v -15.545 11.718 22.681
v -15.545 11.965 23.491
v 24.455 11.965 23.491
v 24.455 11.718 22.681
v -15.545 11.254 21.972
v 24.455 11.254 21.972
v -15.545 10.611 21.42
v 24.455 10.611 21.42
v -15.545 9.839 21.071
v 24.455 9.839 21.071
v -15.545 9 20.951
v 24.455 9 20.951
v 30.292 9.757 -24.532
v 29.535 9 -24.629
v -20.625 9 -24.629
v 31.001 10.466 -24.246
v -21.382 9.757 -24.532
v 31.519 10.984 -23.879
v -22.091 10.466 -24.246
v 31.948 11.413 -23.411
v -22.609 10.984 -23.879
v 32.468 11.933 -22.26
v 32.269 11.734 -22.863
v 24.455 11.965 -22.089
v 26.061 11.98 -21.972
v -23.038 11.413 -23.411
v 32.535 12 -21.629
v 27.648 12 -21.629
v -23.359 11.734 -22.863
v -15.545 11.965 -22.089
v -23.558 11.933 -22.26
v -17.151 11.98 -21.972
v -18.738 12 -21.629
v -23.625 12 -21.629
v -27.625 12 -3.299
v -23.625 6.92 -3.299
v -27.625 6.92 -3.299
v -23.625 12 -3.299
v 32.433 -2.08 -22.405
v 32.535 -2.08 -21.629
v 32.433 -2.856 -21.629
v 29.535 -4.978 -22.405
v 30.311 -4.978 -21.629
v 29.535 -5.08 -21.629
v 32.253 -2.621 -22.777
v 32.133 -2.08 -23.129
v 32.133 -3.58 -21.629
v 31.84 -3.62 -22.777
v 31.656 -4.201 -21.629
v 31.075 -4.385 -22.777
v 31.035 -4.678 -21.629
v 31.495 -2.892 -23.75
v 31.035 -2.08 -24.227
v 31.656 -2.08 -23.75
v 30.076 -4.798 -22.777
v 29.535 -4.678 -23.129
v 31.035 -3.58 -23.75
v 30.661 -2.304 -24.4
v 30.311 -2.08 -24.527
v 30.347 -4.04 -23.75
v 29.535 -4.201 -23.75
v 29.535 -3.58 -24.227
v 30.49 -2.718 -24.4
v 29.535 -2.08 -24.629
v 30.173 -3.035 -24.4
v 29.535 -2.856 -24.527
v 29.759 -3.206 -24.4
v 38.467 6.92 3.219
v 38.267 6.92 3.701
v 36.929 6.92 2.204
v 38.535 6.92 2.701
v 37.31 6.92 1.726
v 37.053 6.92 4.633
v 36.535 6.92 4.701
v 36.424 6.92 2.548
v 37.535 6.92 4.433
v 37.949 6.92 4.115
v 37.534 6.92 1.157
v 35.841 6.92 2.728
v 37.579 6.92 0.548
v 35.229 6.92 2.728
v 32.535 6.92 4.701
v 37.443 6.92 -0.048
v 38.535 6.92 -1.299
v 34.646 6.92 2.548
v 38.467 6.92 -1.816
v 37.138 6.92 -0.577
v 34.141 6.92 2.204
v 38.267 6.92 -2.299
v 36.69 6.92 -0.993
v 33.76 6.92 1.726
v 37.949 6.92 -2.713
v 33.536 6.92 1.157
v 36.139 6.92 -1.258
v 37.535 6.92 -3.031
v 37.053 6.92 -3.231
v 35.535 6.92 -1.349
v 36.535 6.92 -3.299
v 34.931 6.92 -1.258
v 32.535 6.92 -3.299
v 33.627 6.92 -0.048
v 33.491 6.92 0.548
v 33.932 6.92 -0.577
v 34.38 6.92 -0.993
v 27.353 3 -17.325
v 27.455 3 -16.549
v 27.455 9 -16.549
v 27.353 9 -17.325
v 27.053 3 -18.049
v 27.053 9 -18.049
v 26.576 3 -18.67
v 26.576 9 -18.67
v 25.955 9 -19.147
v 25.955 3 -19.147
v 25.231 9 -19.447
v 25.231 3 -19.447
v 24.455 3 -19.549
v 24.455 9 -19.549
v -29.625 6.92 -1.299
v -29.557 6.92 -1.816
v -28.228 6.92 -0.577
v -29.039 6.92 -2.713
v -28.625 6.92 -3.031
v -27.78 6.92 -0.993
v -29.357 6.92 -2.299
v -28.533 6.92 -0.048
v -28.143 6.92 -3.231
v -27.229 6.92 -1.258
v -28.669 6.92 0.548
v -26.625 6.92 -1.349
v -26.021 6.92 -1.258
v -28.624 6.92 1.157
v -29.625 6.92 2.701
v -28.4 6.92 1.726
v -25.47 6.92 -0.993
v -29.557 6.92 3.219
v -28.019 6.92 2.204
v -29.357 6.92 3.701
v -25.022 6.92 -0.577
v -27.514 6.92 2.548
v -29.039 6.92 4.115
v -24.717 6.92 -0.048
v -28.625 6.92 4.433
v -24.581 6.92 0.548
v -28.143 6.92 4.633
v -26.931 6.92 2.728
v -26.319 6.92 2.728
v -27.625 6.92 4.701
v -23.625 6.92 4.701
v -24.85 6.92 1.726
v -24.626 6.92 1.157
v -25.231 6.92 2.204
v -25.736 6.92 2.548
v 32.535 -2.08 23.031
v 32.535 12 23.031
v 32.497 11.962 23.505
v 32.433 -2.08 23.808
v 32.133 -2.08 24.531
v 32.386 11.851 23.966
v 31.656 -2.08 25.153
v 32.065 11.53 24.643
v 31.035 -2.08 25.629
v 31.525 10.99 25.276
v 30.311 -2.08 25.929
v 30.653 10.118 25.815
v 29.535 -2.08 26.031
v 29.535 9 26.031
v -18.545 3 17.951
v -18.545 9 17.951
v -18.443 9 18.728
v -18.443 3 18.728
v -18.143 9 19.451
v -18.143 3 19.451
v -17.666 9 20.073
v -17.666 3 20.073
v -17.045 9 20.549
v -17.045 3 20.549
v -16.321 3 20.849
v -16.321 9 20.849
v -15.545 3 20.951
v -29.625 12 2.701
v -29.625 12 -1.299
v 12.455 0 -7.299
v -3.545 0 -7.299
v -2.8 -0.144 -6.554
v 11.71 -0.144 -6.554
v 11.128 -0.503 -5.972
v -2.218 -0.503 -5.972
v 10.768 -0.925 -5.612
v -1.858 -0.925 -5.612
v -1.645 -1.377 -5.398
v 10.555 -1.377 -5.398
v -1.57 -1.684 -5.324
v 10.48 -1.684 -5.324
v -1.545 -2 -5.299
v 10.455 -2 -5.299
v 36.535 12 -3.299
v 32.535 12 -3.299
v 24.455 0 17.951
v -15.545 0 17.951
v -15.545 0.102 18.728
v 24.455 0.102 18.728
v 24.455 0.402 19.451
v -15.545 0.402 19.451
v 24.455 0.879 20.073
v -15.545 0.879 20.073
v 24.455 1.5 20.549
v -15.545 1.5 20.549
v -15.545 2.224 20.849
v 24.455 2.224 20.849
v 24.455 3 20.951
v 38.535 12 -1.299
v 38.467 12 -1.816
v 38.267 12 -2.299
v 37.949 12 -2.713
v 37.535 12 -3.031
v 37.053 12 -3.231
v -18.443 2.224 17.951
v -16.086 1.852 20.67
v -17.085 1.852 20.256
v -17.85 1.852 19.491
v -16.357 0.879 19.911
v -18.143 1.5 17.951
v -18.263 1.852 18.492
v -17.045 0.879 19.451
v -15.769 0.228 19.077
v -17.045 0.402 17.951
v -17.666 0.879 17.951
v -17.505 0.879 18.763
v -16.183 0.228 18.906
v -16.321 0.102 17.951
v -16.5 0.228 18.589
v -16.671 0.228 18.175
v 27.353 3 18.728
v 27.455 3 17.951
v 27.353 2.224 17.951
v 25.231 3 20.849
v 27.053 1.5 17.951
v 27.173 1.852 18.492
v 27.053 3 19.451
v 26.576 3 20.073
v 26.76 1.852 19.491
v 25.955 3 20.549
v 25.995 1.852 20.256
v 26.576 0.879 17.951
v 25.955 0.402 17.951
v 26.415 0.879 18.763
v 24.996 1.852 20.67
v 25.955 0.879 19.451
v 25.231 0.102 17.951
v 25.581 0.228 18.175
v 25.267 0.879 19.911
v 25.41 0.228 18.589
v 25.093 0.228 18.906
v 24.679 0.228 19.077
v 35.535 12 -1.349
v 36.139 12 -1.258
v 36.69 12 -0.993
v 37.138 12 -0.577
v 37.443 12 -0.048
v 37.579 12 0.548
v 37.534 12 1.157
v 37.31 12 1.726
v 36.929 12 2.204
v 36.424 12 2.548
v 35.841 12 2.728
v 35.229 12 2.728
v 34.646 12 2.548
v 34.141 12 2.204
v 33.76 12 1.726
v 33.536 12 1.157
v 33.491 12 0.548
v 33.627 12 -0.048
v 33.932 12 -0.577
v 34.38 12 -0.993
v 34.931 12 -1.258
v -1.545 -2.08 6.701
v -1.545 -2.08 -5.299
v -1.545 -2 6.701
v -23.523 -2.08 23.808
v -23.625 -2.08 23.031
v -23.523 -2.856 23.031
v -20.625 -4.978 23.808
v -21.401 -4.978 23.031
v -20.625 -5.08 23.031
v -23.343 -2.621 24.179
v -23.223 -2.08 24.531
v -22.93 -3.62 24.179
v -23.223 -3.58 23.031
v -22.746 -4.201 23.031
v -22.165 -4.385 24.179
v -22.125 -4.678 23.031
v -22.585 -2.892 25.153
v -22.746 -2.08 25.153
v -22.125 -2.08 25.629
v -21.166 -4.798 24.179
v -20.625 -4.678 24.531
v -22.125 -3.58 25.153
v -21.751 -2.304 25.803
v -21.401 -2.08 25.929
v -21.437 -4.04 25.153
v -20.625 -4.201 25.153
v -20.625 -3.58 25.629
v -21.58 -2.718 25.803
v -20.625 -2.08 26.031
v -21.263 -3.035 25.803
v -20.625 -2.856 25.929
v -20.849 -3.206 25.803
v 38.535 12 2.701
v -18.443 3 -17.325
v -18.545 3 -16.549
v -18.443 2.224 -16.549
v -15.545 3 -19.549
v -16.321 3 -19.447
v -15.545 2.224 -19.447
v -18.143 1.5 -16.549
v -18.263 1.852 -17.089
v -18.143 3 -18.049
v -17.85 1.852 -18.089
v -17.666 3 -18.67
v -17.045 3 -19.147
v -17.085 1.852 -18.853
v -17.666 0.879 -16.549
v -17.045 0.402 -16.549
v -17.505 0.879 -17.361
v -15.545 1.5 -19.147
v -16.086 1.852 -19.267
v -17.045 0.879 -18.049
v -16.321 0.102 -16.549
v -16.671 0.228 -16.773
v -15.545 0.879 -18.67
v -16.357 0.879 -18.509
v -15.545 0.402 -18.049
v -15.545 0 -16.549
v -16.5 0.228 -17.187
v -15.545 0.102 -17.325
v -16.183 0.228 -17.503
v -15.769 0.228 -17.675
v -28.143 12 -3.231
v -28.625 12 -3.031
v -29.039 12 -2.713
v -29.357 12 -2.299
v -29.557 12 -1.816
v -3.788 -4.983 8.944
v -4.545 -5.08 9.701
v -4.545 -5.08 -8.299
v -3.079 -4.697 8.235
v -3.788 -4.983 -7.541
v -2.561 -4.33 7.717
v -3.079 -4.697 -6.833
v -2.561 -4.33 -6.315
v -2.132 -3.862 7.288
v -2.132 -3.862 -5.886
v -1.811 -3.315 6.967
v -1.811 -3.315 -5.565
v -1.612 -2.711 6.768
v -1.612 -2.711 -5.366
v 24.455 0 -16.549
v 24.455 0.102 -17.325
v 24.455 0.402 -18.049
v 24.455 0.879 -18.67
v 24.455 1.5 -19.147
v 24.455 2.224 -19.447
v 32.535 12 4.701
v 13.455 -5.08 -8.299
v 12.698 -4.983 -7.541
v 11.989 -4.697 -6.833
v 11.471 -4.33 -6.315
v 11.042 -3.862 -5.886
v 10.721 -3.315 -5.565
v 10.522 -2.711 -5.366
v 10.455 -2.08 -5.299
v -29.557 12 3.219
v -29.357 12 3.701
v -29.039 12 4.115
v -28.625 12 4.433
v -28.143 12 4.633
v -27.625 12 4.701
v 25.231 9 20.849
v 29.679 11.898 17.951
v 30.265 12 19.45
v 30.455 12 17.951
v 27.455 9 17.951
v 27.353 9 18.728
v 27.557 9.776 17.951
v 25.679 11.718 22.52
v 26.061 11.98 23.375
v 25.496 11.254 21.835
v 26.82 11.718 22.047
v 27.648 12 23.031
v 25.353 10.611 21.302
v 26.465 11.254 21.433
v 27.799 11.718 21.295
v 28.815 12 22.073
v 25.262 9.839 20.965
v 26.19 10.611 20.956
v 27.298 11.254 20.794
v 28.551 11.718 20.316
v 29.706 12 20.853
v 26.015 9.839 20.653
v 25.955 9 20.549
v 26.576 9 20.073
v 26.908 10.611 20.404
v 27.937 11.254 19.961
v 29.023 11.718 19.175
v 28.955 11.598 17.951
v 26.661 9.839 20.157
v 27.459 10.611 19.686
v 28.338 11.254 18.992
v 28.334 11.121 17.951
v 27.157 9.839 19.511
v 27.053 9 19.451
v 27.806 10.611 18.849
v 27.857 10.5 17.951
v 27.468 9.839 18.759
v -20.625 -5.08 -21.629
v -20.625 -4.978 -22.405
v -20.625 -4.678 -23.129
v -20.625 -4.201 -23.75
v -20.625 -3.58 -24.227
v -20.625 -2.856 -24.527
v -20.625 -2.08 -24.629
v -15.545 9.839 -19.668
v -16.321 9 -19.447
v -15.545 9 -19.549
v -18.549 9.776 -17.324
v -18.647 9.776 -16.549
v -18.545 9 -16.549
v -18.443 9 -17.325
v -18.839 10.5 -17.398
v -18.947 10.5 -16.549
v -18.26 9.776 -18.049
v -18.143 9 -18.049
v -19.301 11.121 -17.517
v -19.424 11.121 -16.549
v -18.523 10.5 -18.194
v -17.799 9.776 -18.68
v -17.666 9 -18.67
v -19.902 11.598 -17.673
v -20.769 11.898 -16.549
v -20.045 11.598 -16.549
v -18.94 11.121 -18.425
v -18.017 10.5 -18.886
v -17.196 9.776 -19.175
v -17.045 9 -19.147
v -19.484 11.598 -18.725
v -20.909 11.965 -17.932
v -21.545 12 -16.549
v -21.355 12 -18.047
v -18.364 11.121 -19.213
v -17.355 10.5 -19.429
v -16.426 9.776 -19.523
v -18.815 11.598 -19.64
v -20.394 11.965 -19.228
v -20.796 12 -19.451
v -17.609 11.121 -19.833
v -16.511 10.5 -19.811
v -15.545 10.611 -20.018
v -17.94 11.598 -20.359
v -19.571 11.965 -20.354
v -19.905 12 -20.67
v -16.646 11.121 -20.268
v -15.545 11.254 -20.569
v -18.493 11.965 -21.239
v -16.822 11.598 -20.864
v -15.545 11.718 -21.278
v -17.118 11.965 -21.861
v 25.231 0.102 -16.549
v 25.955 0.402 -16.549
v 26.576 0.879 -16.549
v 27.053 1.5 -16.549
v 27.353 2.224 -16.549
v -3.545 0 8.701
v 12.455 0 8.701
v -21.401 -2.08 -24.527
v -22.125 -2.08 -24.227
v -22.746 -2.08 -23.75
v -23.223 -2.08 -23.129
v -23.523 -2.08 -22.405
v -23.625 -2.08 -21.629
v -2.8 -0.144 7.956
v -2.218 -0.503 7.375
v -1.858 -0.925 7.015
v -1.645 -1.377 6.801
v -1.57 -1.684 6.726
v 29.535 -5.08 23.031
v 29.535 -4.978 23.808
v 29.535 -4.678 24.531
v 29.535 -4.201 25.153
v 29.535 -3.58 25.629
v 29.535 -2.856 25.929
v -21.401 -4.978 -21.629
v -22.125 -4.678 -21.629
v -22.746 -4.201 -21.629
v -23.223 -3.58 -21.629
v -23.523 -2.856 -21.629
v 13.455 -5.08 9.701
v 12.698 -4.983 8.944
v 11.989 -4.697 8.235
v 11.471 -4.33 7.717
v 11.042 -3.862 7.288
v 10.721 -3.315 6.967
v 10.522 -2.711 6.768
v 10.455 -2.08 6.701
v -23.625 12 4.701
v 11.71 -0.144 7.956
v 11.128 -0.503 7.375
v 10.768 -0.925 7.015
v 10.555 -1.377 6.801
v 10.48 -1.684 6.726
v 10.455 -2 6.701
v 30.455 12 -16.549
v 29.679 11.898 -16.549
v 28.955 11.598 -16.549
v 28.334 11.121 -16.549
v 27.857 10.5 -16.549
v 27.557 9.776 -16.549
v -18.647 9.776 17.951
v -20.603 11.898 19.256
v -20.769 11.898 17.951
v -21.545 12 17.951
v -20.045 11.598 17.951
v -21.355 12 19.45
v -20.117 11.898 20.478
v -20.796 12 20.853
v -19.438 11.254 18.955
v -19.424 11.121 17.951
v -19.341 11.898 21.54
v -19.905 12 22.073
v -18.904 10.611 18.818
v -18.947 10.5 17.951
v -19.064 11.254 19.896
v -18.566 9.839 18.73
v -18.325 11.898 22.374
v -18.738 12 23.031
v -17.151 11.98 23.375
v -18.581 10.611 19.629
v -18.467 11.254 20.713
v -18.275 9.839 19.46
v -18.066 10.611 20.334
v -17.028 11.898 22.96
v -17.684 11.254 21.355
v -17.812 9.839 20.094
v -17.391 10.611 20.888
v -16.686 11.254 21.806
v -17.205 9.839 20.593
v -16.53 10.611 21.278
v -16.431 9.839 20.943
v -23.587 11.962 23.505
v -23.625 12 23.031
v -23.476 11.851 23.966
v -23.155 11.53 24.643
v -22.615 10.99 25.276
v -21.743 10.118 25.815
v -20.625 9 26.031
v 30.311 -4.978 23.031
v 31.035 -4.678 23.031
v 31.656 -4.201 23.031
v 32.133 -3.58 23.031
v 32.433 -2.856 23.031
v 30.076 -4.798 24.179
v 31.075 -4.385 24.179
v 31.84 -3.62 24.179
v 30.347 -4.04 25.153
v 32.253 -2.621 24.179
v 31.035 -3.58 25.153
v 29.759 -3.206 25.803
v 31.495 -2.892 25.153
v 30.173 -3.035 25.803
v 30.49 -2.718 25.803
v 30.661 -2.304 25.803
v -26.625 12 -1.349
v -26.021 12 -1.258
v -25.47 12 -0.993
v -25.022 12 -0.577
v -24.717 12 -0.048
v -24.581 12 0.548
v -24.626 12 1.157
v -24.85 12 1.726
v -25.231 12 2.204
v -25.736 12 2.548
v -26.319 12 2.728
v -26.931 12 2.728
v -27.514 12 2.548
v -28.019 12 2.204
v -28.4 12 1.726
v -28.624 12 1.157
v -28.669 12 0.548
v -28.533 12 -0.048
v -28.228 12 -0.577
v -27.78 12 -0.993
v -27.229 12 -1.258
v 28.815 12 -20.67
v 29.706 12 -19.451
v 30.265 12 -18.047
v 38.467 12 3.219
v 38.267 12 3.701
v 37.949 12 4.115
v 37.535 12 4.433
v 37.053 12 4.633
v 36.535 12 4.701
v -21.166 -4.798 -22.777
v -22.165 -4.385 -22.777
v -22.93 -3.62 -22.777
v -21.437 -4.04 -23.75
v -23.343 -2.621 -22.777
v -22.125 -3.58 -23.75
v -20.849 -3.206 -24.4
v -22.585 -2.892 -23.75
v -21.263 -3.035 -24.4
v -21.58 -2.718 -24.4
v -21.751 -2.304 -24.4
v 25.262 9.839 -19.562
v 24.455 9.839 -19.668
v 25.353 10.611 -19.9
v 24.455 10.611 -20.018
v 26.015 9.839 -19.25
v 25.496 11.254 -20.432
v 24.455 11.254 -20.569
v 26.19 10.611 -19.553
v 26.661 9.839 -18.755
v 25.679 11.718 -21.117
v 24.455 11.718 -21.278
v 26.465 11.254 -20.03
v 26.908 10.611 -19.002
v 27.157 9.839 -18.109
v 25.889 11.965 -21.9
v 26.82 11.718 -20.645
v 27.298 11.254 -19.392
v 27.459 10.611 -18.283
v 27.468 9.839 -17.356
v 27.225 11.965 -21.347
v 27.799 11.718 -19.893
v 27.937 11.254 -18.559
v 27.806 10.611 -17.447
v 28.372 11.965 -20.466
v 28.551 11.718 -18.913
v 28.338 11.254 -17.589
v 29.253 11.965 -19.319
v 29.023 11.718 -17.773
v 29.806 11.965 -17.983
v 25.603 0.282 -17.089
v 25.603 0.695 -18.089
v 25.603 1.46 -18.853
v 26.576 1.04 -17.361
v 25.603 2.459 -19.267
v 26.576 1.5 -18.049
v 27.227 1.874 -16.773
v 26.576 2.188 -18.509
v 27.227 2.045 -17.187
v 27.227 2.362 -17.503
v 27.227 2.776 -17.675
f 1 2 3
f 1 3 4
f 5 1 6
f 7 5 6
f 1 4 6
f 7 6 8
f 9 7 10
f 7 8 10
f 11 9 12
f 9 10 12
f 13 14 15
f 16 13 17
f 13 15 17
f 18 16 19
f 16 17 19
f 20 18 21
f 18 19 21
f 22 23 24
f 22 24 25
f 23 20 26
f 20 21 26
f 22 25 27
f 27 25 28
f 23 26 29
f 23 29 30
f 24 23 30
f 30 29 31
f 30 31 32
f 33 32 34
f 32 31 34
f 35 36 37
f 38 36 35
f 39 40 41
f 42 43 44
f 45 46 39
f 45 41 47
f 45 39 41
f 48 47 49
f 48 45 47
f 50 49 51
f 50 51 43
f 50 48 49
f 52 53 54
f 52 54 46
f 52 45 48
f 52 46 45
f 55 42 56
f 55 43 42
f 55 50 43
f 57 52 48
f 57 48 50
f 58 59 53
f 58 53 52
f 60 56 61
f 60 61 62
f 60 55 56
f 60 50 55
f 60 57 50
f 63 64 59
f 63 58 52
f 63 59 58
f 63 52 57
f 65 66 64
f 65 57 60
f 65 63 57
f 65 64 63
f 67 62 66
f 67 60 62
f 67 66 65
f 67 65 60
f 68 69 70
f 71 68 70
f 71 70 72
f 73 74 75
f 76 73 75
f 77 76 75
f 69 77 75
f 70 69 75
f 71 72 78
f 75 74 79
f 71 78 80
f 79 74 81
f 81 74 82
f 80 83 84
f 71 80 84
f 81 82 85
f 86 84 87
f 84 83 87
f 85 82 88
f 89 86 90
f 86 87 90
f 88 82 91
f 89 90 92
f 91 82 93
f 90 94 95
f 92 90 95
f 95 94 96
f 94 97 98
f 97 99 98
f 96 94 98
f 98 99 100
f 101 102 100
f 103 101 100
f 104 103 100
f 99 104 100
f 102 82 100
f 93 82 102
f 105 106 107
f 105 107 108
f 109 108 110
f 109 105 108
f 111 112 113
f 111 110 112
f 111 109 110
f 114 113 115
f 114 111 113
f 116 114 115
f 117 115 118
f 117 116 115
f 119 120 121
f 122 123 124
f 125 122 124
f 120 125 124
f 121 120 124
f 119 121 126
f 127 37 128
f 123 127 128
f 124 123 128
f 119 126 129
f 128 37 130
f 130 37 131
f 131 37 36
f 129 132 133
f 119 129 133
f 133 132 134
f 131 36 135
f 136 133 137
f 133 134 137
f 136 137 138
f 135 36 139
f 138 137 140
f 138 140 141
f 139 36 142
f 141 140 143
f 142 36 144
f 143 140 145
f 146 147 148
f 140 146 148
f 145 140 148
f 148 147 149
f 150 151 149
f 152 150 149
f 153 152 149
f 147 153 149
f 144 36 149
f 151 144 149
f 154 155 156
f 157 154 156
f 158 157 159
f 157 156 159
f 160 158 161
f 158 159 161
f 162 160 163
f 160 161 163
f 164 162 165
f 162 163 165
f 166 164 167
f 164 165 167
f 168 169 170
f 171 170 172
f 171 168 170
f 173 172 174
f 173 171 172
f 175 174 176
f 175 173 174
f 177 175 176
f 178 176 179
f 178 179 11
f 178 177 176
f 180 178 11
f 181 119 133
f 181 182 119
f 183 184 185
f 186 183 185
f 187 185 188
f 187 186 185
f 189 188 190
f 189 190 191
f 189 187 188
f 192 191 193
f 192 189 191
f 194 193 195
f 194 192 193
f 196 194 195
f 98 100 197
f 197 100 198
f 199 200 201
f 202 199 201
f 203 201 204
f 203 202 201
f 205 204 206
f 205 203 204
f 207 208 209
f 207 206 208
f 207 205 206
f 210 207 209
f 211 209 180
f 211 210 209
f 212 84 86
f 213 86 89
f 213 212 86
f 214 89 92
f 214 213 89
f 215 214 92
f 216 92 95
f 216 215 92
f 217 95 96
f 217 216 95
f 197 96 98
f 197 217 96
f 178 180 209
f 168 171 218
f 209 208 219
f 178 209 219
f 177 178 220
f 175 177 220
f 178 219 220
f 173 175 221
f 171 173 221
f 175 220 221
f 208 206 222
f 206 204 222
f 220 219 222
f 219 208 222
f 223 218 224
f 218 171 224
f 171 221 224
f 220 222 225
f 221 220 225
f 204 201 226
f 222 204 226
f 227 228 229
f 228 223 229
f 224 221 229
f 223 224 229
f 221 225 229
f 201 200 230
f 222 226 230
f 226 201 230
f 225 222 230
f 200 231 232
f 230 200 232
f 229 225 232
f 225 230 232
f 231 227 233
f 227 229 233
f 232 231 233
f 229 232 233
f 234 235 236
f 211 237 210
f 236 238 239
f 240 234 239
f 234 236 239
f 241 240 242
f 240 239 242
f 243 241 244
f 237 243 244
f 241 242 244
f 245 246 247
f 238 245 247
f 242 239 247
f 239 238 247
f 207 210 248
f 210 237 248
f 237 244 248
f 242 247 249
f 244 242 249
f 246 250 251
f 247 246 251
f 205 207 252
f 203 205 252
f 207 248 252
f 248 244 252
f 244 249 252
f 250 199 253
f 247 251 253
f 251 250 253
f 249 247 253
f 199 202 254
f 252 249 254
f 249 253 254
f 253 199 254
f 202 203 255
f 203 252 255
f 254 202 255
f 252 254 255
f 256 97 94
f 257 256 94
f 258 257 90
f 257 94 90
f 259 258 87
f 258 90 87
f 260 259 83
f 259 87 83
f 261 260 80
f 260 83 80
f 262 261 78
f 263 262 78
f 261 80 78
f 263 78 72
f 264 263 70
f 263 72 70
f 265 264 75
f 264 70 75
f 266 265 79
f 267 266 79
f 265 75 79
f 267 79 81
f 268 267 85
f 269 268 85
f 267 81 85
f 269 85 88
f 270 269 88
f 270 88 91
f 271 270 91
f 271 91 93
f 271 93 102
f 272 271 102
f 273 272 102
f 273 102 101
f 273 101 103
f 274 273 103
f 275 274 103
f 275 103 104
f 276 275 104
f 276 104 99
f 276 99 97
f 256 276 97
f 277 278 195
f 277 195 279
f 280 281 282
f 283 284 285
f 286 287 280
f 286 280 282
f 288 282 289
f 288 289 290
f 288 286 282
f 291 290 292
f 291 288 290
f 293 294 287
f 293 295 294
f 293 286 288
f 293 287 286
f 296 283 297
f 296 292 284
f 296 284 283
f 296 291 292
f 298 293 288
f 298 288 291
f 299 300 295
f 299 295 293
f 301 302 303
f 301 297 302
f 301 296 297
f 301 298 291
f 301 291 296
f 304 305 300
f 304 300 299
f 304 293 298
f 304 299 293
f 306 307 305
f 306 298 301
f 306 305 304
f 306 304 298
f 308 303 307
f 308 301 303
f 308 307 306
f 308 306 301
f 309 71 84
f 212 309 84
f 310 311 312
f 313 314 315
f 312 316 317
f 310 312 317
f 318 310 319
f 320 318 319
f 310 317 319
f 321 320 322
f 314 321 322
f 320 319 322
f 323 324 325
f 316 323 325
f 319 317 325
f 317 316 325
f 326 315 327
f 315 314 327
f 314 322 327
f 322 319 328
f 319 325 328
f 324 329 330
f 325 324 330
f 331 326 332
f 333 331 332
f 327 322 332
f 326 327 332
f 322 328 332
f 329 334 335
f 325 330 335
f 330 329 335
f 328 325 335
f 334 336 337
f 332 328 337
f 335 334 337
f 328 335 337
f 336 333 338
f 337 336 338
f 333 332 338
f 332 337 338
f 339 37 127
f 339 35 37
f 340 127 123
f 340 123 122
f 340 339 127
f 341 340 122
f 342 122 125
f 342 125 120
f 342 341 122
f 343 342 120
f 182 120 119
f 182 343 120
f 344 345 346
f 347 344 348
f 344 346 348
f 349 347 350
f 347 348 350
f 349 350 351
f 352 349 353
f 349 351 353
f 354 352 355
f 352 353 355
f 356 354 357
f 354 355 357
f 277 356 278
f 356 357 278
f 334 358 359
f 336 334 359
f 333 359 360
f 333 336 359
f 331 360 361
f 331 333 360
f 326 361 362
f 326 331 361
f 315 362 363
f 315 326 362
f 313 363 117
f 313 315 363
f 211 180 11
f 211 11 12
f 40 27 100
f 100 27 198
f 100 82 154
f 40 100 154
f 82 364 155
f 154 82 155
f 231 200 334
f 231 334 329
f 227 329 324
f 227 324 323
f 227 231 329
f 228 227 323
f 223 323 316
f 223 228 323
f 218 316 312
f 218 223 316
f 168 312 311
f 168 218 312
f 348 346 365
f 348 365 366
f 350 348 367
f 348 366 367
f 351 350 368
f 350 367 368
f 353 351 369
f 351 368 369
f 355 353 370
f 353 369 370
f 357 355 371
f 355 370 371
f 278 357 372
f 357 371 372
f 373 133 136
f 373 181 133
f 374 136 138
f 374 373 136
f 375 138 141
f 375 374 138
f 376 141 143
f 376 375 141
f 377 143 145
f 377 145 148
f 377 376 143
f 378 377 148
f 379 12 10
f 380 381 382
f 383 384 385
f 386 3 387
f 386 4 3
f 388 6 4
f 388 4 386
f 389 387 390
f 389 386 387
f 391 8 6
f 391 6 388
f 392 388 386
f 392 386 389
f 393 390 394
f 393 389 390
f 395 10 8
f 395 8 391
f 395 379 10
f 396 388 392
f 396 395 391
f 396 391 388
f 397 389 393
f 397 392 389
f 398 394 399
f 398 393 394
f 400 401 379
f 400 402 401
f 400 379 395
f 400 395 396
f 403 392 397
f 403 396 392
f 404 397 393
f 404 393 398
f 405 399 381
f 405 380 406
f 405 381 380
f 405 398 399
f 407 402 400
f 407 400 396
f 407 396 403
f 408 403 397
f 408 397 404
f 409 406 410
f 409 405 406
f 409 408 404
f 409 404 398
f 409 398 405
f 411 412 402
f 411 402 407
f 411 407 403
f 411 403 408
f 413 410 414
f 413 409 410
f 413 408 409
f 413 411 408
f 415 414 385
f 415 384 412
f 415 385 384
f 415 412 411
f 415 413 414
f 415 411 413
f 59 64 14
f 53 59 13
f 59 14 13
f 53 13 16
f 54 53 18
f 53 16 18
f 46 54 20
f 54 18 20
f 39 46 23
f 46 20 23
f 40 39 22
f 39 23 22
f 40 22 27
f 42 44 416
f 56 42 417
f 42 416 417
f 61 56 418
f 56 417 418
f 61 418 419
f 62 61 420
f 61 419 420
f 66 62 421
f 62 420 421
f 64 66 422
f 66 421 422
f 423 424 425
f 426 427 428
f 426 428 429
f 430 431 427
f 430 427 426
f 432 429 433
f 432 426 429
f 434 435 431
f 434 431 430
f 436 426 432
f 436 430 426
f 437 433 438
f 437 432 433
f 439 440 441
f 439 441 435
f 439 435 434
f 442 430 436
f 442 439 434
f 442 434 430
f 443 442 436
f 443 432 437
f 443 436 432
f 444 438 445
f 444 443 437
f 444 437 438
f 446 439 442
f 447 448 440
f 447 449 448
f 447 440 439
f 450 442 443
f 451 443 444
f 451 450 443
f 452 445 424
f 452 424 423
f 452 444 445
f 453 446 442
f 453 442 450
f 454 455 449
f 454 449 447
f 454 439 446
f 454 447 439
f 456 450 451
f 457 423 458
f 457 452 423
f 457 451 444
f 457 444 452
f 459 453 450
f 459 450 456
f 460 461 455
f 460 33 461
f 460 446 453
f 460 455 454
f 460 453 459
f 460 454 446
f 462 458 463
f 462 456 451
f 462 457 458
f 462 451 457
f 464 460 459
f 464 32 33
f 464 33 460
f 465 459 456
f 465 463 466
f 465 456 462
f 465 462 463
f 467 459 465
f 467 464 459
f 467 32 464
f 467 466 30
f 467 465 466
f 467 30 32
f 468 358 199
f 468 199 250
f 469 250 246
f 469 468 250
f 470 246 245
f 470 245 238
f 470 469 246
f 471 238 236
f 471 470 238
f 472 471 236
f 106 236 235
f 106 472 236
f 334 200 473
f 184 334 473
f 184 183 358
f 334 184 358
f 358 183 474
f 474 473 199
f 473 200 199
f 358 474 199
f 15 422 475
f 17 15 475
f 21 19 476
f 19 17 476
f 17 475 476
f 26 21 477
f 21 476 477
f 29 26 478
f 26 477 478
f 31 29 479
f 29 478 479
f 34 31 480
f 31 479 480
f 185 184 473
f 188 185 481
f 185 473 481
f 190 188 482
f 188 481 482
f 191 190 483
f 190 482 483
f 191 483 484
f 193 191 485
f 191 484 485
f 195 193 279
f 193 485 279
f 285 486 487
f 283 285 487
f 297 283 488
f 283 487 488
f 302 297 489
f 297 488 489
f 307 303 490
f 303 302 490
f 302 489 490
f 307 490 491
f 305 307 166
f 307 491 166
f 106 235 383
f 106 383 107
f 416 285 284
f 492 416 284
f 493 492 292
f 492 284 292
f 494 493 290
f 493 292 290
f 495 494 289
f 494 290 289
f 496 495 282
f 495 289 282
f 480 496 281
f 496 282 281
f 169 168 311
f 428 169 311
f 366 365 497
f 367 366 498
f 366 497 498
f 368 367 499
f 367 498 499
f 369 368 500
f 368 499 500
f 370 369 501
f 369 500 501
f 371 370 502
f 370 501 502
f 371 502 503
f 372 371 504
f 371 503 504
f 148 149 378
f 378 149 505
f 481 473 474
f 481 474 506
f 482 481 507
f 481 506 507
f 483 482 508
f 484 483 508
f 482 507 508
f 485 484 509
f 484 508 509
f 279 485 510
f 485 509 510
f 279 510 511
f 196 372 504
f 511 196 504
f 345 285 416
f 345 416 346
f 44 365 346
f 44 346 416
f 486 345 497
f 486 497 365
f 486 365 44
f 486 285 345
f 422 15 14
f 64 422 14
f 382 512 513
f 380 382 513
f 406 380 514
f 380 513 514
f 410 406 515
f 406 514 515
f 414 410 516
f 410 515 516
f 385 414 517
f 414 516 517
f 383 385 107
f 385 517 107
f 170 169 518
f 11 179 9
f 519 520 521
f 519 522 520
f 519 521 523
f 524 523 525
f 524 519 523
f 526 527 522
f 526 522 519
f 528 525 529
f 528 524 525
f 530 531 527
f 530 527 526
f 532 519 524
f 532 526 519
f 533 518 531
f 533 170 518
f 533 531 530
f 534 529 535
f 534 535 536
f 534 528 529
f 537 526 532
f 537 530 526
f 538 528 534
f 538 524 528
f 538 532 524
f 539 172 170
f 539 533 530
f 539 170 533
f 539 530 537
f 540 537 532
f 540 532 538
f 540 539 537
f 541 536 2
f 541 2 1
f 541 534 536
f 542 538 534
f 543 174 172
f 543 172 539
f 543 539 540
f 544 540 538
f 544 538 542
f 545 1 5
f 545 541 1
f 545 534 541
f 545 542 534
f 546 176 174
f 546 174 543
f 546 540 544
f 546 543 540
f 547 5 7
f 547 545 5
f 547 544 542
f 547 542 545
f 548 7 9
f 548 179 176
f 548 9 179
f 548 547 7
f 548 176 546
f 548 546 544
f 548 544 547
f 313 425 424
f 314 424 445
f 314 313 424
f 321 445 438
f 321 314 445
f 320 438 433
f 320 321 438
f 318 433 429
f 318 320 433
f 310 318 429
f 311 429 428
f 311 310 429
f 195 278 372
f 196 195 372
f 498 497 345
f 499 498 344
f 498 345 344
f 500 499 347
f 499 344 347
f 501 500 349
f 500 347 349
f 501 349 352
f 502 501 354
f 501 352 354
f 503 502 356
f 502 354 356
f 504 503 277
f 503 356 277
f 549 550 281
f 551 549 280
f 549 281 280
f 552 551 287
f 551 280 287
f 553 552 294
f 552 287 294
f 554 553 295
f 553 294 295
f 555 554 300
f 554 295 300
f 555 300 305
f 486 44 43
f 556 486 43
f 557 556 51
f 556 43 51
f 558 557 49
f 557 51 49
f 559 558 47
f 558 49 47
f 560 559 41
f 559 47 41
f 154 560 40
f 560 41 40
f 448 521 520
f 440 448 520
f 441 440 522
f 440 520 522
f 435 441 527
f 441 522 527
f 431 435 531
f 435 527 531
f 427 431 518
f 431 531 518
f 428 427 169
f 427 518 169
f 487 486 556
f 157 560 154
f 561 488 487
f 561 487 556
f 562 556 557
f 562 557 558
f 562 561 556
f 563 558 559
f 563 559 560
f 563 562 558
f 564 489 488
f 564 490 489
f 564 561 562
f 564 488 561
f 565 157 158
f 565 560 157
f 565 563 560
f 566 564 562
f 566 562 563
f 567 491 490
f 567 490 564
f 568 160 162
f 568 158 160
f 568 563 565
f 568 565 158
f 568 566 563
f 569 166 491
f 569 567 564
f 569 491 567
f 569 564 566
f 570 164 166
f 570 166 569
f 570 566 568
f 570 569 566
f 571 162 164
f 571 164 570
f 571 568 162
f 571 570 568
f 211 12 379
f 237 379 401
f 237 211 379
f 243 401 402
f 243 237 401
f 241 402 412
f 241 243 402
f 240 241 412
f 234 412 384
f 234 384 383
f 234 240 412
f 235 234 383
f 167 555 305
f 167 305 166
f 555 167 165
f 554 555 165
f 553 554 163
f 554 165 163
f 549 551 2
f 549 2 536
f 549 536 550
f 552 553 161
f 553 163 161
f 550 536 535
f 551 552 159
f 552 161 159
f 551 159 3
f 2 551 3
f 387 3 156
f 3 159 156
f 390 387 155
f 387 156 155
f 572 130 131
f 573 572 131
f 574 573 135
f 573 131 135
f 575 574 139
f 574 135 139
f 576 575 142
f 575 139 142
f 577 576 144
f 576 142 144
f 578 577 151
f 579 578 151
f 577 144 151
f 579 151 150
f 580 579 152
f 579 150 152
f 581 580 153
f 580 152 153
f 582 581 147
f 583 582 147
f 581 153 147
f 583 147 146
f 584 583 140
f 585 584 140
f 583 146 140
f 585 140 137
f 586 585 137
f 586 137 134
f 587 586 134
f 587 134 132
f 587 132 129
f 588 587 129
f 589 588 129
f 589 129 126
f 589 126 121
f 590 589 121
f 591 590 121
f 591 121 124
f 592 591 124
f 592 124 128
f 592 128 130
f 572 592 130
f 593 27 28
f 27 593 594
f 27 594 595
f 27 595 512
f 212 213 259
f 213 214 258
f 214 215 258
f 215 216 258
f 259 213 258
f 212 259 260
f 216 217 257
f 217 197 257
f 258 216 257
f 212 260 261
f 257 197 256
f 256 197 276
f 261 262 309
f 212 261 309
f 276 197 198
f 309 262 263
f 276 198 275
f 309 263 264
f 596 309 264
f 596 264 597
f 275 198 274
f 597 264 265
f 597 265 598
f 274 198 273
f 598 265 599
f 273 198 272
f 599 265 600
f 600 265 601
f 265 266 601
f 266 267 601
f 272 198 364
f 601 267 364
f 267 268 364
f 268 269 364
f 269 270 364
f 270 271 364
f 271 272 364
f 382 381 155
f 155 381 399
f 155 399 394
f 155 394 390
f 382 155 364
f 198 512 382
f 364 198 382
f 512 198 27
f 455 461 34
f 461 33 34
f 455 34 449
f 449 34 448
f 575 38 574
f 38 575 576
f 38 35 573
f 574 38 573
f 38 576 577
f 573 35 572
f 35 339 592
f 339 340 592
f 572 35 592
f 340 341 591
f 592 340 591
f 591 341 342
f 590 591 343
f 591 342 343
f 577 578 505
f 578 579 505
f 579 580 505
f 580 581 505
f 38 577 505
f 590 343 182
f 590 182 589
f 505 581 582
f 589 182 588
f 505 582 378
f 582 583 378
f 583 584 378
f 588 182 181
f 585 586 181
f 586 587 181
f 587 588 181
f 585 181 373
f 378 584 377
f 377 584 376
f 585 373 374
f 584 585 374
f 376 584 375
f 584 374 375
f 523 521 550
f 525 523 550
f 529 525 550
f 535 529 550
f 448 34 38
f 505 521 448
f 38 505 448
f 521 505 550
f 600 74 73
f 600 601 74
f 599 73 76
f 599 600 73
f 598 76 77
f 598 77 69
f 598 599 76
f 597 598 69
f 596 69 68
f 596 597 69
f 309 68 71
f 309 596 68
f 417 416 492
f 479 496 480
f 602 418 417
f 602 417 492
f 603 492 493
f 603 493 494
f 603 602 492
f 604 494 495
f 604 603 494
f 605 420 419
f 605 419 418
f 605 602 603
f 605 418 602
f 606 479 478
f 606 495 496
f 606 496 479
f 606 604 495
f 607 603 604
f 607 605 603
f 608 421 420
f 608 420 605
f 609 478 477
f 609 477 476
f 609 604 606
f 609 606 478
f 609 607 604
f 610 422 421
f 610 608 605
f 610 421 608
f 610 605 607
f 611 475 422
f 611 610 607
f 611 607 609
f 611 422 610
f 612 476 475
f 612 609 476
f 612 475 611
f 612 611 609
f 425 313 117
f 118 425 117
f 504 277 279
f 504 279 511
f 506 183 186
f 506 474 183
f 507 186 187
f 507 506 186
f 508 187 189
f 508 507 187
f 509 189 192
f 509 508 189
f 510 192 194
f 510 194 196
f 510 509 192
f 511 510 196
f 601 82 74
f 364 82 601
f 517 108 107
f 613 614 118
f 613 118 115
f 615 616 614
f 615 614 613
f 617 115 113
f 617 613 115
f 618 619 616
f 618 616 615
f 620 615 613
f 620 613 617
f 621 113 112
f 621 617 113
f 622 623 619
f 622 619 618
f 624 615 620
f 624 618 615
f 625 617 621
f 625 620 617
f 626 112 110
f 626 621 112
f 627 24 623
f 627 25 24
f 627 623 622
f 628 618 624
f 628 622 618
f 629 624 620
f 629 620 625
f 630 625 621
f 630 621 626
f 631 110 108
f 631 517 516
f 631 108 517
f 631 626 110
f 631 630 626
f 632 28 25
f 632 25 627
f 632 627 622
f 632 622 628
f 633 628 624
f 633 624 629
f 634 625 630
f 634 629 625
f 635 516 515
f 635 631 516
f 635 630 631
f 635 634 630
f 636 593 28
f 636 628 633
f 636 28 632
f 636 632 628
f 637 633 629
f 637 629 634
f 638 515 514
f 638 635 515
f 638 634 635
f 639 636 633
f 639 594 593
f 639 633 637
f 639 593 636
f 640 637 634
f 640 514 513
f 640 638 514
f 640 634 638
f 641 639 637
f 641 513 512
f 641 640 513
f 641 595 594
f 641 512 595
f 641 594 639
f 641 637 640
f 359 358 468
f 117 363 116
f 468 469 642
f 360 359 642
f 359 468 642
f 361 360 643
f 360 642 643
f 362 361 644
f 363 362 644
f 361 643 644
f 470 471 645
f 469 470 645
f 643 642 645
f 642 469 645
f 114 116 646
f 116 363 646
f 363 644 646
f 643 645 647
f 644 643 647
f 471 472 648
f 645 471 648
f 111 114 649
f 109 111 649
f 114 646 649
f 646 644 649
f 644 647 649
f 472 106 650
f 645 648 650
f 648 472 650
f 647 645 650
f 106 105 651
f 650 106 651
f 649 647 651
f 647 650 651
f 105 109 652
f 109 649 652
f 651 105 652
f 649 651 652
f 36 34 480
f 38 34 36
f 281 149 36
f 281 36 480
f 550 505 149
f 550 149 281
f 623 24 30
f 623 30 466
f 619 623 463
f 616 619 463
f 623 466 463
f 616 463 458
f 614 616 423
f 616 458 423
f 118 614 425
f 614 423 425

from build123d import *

# Parameters (mm, degrees)
SKETCH1_W           = 56.16
SKETCH1_H           = 50.66
SKETCH1_W_2         = 46
SKETCH1_H_2         = 40.5
BOSS_EXTRUDE1_DEPTH = 12
SKETCH2_W           = 56.16
SKETCH2_H           = 50.66
BOSS_EXTRUDE2_DEPTH = 5.08
SKETCH3_W           = 12
SKETCH3_H           = 12
CUT_EXTRUDE1_DEPTH  = 5.08
SKETCH4_W           = 8
SKETCH4_H           = 5.08
BOSS_EXTRUDE3_DEPTH = 6
SKETCH5_W           = 8
SKETCH5_H           = 5.08
BOSS_EXTRUDE4_DEPTH = 6
SKETCH6_R           = 2.05
CUT_EXTRUDE2_DEPTH  = 6
FILLET1_R           = 3
FILLET2_R           = 2
FILLET3_R           = 2


with BuildPart() as part:
    # Sketch1 → Boss-Extrude1 (new body)
    with BuildSketch(Plane(origin=(0, 0, 0), x_dir=(1, 0, 0), z_dir=(0, 1, 0))):
        with Locations((4.455, -0.70125)):
            Rectangle(SKETCH1_W, SKETCH1_H)
        with Locations((4.455, -0.70125)):
            Rectangle(SKETCH1_W_2, SKETCH1_H_2, mode=Mode.SUBTRACT)
    extrude(amount=BOSS_EXTRUDE1_DEPTH)

    # Sketch2 → Boss-Extrude2 (add)
    with BuildSketch(Plane.XZ):
        with Locations((4.455, 0.70125)):
            Rectangle(SKETCH2_W, SKETCH2_H)
    extrude(amount=BOSS_EXTRUDE2_DEPTH)

    # Sketch3 → Cut-Extrude1 (cut)
    with BuildSketch(Plane.XZ.offset(5.08)):
        with Locations((4.455, 0.70125)):
            Rectangle(SKETCH3_W, SKETCH3_H)
    extrude(amount=-CUT_EXTRUDE1_DEPTH, mode=Mode.SUBTRACT)

    # Sketch4 → Boss-Extrude3 (add)
    with BuildSketch(Plane(origin=(32.535, 0, 0), x_dir=(0, 0, -1), z_dir=(1, 0, 0))):
        with Locations((-0.70125, 9.46)):
            Rectangle(SKETCH4_W, SKETCH4_H)
    extrude(amount=BOSS_EXTRUDE3_DEPTH)

    # Sketch5 → Boss-Extrude4 (add)
    with BuildSketch(Plane.ZY.offset(23.625)):
        with Locations((0.70125, 9.46)):
            Rectangle(SKETCH5_W, SKETCH5_H)
    extrude(amount=BOSS_EXTRUDE4_DEPTH)

    # Sketch6 → Cut-Extrude2 (cut)
    with BuildSketch(Plane.XZ.offset(-6.92)):
        with Locations(Location((35.535, 0.70125, 0), (0, 0, 270))):
            Circle(SKETCH6_R)
        with Locations(Location((-26.625, 0.70125, 0), (0, 0, 270))):
            Circle(SKETCH6_R)
    extrude(amount=-CUT_EXTRUDE2_DEPTH, mode=Mode.SUBTRACT)

    # Fillet1
    # the kernel refuses this fillet: 3 mm, written as the material it adds along each edge
    with BuildSketch(Plane(origin=(-15.545, 3, 17.95125), x_dir=(-1, 0, 0), z_dir=(0, -1, 0))) as fillet1_piece_1_section:
        Polygon((0, 0), (FILLET1_R, 0), (FILLET1_R, -FILLET1_R), (0, -FILLET1_R), align=None)
    fillet1_piece_1 = extrude(amount=FILLET1_R, mode=Mode.PRIVATE)
    fillet1_piece_1 = fillet1_piece_1 - Plane(origin=(-15.545, 3, 17.95125), x_dir=(0.7071067811865475, 0, -0.7071067811865475), z_dir=(0, -1, 0)) * Sphere(FILLET1_R, mode=Mode.PRIVATE)
    add(fillet1_piece_1)
    with BuildSketch(Plane(origin=(-15.545, 3, -16.54875), x_dir=(-1, 0, 0), z_dir=(0, -1, 0))) as fillet1_piece_2_section:
        Polygon((0, 0), (FILLET1_R, 0), (FILLET1_R, FILLET1_R), (0, FILLET1_R), align=None)
    fillet1_piece_2 = extrude(amount=FILLET1_R, mode=Mode.PRIVATE)
    fillet1_piece_2 = fillet1_piece_2 - Plane(origin=(-15.545, 3, -16.54875), x_dir=(0.7071067811865476, 0, 0.7071067811865475), z_dir=(0, -1, 0)) * Sphere(FILLET1_R, mode=Mode.PRIVATE)
    add(fillet1_piece_2)
    with BuildSketch(Plane(origin=(24.455, 3, 17.95125), x_dir=(1, 0, 0), z_dir=(0, -1, 0))) as fillet1_piece_3_section:
        Polygon((0, 0), (FILLET1_R, 0), (FILLET1_R, FILLET1_R), (0, FILLET1_R), align=None)
    fillet1_piece_3 = extrude(amount=FILLET1_R, mode=Mode.PRIVATE)
    fillet1_piece_3 = fillet1_piece_3 - Plane(origin=(24.455, 3, 17.95125), x_dir=(-0.7071067811865476, 0, -0.7071067811865475), z_dir=(0, -1, 0)) * Sphere(FILLET1_R, mode=Mode.PRIVATE)
    add(fillet1_piece_3)
    with BuildSketch(Plane(origin=(24.455, 3, -16.54875), x_dir=(0, -1, 0), z_dir=(1, 0, 0))) as fillet1_piece_4_section:
        Polygon((0, 0), (FILLET1_R, 0), (FILLET1_R, FILLET1_R), (0, FILLET1_R), align=None)
    fillet1_piece_4 = extrude(amount=FILLET1_R, mode=Mode.PRIVATE)
    fillet1_piece_4 = fillet1_piece_4 - Plane(origin=(24.455, 3, -16.54875), x_dir=(0, 0.7071067811865475, 0.7071067811865475), z_dir=(1, 0, 0)) * Sphere(FILLET1_R, mode=Mode.PRIVATE)
    add(fillet1_piece_4)
    with BuildSketch(Plane(origin=(-18.545, 0, 17.95125), x_dir=(0, 1, 0), z_dir=(0, 0, -1)), Plane(origin=(27.455, 0, -16.54875), x_dir=(0, 1, 0), z_dir=(0, 0, 1))) as fillet1_piece_5:
        with BuildLine():
            CenterArc((FILLET1_R, FILLET1_R), FILLET1_R, 180, 90)
            Line((0, FILLET1_R), (0, 0))
            Line((0, 0), (FILLET1_R, 0))
        make_face()
    extrude(amount=34.5)
    with BuildSketch(Plane(origin=(-18.545, 3, -19.54875), x_dir=(0, 0, 1), z_dir=(0, 1, 0)), Plane(origin=(27.455, 3, -19.54875), x_dir=(-1, 0, 0), z_dir=(0, 1, 0))) as fillet1_piece_6:
        with BuildLine():
            CenterArc((FILLET1_R, FILLET1_R), FILLET1_R, 180, 90)
            Line((0, FILLET1_R), (0, 0))
            Line((0, 0), (FILLET1_R, 0))
        make_face()
    extrude(amount=9)
    with BuildSketch(Plane(origin=(24.455, 0, 20.95125), x_dir=(0, 1, 0), z_dir=(-1, 0, 0)), Plane(origin=(-15.545, 0, -19.54875), x_dir=(0, 1, 0), z_dir=(1, 0, 0))) as fillet1_piece_7:
        with BuildLine():
            CenterArc((FILLET1_R, FILLET1_R), FILLET1_R, 180, 90)
            Line((0, FILLET1_R), (0, 0))
            Line((0, 0), (FILLET1_R, 0))
        make_face()
    extrude(amount=40)
    with BuildSketch(Plane(origin=(-18.545, 3, 20.95125), x_dir=(0, 0, -1), z_dir=(0, 1, 0)), Plane(origin=(27.455, 3, 20.95125), x_dir=(-1, 0, 0), z_dir=(0, 1, 0))) as fillet1_piece_8:
        with BuildLine():
            CenterArc((FILLET1_R, -FILLET1_R), FILLET1_R, 90, 90)
            Line((0, -FILLET1_R), (0, 0))
            Line((0, 0), (FILLET1_R, 0))
        make_face()
    extrude(amount=9)
    # the kernel refuses this fillet: 3 mm, written as the material it takes off along each edge
    with BuildSketch(Plane(origin=(29.535, -2.08, -21.62875), x_dir=(1, 0, 0), z_dir=(0, 0, -1))) as fillet1_2_piece_1_section:
        Polygon((0, 0), (FILLET1_R, 0), (FILLET1_R, FILLET1_R), (0, FILLET1_R), align=None)
    fillet1_2_piece_1 = extrude(amount=FILLET1_R, mode=Mode.PRIVATE)
    fillet1_2_piece_1 = fillet1_2_piece_1 - Plane(origin=(29.535, -2.08, -21.62875), x_dir=(-0.7071067811865475, 0.7071067811865475, 0), z_dir=(0, 0, -1)) * Sphere(FILLET1_R, mode=Mode.PRIVATE)
    add(fillet1_2_piece_1, mode=Mode.SUBTRACT)
    with BuildSketch(Plane(origin=(29.535, -2.08, 23.03125), x_dir=(1, 0, 0), z_dir=(0, 0, 1))) as fillet1_2_piece_2_section:
        Polygon((0, 0), (FILLET1_R, 0), (FILLET1_R, -FILLET1_R), (0, -FILLET1_R), align=None)
    fillet1_2_piece_2 = extrude(amount=FILLET1_R, mode=Mode.PRIVATE)
    fillet1_2_piece_2 = fillet1_2_piece_2 - Plane(origin=(29.535, -2.08, 23.03125), x_dir=(-0.7071067811865475, 0.7071067811865475, 0), z_dir=(0, 0, 1)) * Sphere(FILLET1_R, mode=Mode.PRIVATE)
    add(fillet1_2_piece_2, mode=Mode.SUBTRACT)
    with BuildSketch(Plane(origin=(-20.625, -2.08, 23.03125), x_dir=(0, -1, 0), z_dir=(0, 0, 1))) as fillet1_2_piece_3_section:
        Polygon((0, 0), (FILLET1_R, 0), (FILLET1_R, -FILLET1_R), (0, -FILLET1_R), align=None)
    fillet1_2_piece_3 = extrude(amount=FILLET1_R, mode=Mode.PRIVATE)
    fillet1_2_piece_3 = fillet1_2_piece_3 - Plane(origin=(-20.625, -2.08, 23.03125), x_dir=(0.7071067811865475, 0.7071067811865475, 0), z_dir=(0, 0, 1)) * Sphere(FILLET1_R, mode=Mode.PRIVATE)
    add(fillet1_2_piece_3, mode=Mode.SUBTRACT)
    with BuildSketch(Plane(origin=(-20.625, -2.08, -21.62875), x_dir=(0, -1, 0), z_dir=(0, 0, -1))) as fillet1_2_piece_4_section:
        Polygon((0, 0), (FILLET1_R, 0), (FILLET1_R, FILLET1_R), (0, FILLET1_R), align=None)
    fillet1_2_piece_4 = extrude(amount=FILLET1_R, mode=Mode.PRIVATE)
    fillet1_2_piece_4 = fillet1_2_piece_4 - Plane(origin=(-20.625, -2.08, -21.62875), x_dir=(0.7071067811865475, 0.7071067811865475, 0), z_dir=(0, 0, -1)) * Sphere(FILLET1_R, mode=Mode.PRIVATE)
    add(fillet1_2_piece_4, mode=Mode.SUBTRACT)
    with BuildSketch(Plane(origin=(-31.125, 12, -24.62875), x_dir=(0, -1, 0), z_dir=(1, 0, 0))) as fillet1_2_piece_5:
        with BuildLine():
            CenterArc((FILLET1_R, -FILLET1_R), FILLET1_R, 90, 90)
            Line((0, -FILLET1_R), (0, 0))
            Line((0, 0), (FILLET1_R, 0))
        make_face()
    extrude(amount=71.16, mode=Mode.SUBTRACT)
    with BuildSketch(Plane(origin=(32.535, -5.08, -21.62875), x_dir=(0, 1, 0), z_dir=(0, 0, 1))) as fillet1_2_piece_6:
        with BuildLine():
            CenterArc((FILLET1_R, FILLET1_R), FILLET1_R, 180, 90)
            Line((0, FILLET1_R), (0, 0))
            Line((0, 0), (FILLET1_R, 0))
        make_face()
    extrude(amount=44.66, mode=Mode.SUBTRACT)
    with BuildSketch(Plane(origin=(29.535, -5.08, 26.03125), x_dir=(0, 0, -1), z_dir=(-1, 0, 0))) as fillet1_2_piece_7:
        with BuildLine():
            CenterArc((FILLET1_R, -FILLET1_R), FILLET1_R, 90, 90)
            Line((0, -FILLET1_R), (0, 0))
            Line((0, 0), (FILLET1_R, 0))
        make_face()
    extrude(amount=50.16, mode=Mode.SUBTRACT)
    with BuildSketch(Plane(origin=(-23.625, -5.08, 23.03125), x_dir=(1, 0, 0), z_dir=(0, 0, -1))) as fillet1_2_piece_8:
        with BuildLine():
            CenterArc((FILLET1_R, -FILLET1_R), FILLET1_R, 90, 90)
            Line((0, -FILLET1_R), (0, 0))
            Line((0, 0), (FILLET1_R, 0))
        make_face()
    extrude(amount=44.66, mode=Mode.SUBTRACT)
    with BuildSketch(Plane(origin=(-20.625, -5.08, -24.62875), x_dir=(0, 1, 0), z_dir=(1, 0, 0))) as fillet1_2_piece_9:
        with BuildLine():
            CenterArc((FILLET1_R, FILLET1_R), FILLET1_R, 180, 90)
            Line((0, FILLET1_R), (0, 0))
            Line((0, 0), (FILLET1_R, 0))
        make_face()
    extrude(amount=50.16, mode=Mode.SUBTRACT)
    with BuildSketch(Plane(origin=(10.455, -5.08, 6.70125), x_dir=(1, 0, 0), z_dir=(0, 0, -1)), Plane(origin=(-1.545, -5.08, 6.70125), x_dir=(0, 0, 1), z_dir=(1, 0, 0)), Plane(origin=(-1.545, -5.08, -5.29875), x_dir=(-1, 0, 0), z_dir=(0, 0, 1)), Plane(origin=(10.455, -5.08, -5.29875), x_dir=(0, 0, -1), z_dir=(-1, 0, 0))) as fillet1_2_piece_10:
        with BuildLine():
            CenterArc((FILLET1_R, -FILLET1_R), FILLET1_R, 90, 90)
            Line((0, -FILLET1_R), (0, 0))
            Line((0, 0), (FILLET1_R, 0))
        make_face()
    extrude(amount=12, mode=Mode.SUBTRACT)
    with BuildSketch(Plane(origin=(-23.625, -2.08, -24.62875), x_dir=(1, 0, 0), z_dir=(0, 1, 0)), Plane(origin=(32.535, 19.5, -24.62875), x_dir=(-1, 0, 0), z_dir=(0, -1, 0)), Plane(origin=(32.535, 19.5, 26.03125), x_dir=(0, 0, -1), z_dir=(0, -1, 0)), Plane(origin=(-23.625, -2.08, 26.03125), x_dir=(0, 0, -1), z_dir=(0, 1, 0))) as fillet1_2_piece_11:
        with BuildLine():
            CenterArc((FILLET1_R, -FILLET1_R), FILLET1_R, 90, 90)
            Line((0, -FILLET1_R), (0, 0))
            Line((0, 0), (FILLET1_R, 0))
        make_face()
    extrude(amount=21.58, mode=Mode.SUBTRACT)
    with BuildSketch(Plane(origin=(40.035, 12, 26.03125), x_dir=(0, 0, -1), z_dir=(-1, 0, 0))) as fillet1_2_piece_12:
        with BuildLine():
            CenterArc((FILLET1_R, FILLET1_R), FILLET1_R, 180, 90)
            Line((0, FILLET1_R), (0, 0))
            Line((0, 0), (FILLET1_R, 0))
        make_face()
    extrude(amount=71.16, mode=Mode.SUBTRACT)
    with BuildSketch(Plane(origin=(10.455, -5.08, 14.20125), x_dir=(1, 0, 0), z_dir=(0, 0, -1))) as fillet1_2_piece_13a_section:
        with BuildLine():
            CenterArc((FILLET1_R, -FILLET1_R), FILLET1_R, 90, 90)
            Line((0, -FILLET1_R), (0, 0))
            Line((0, 0), (FILLET1_R, 0))
        make_face()
    fillet1_2_piece_13a = extrude(amount=19.5, mode=Mode.PRIVATE)
    fillet1_2_piece_13a = split(fillet1_2_piece_13a, bisect_by=Plane(origin=(11.134185343, -4.400814657, 6.70125), z_dir=(0, 0, 1)), keep=Keep.TOP, mode=Mode.PRIVATE)
    with BuildSketch(Plane(origin=(-1.545, -5.08, 6.70125), x_dir=(0, 0, 1), z_dir=(1, 0, 0))) as fillet1_2_piece_13b_section:
        with BuildLine():
            CenterArc((FILLET1_R, -FILLET1_R), FILLET1_R, 90, 90)
            Line((0, -FILLET1_R), (0, 0))
            Line((0, 0), (FILLET1_R, 0))
        make_face()
    fillet1_2_piece_13b = extrude(amount=19.5, mode=Mode.PRIVATE)
    fillet1_2_piece_13b = split(fillet1_2_piece_13b, bisect_by=Plane(origin=(10.455, -4.400814657, 7.380435343), z_dir=(1, 0, 0)), keep=Keep.TOP, mode=Mode.PRIVATE)
    fillet1_2_piece_13 = fillet1_2_piece_13a & fillet1_2_piece_13b
    add(fillet1_2_piece_13, mode=Mode.SUBTRACT)
    with BuildSketch(Plane(origin=(10.455, -5.08, 6.70125), x_dir=(1, 0, 0), z_dir=(0, 0, -1))) as fillet1_2_piece_14a_section:
        with BuildLine():
            CenterArc((FILLET1_R, -FILLET1_R), FILLET1_R, 90, 90)
            Line((0, -FILLET1_R), (0, 0))
            Line((0, 0), (FILLET1_R, 0))
        make_face()
    fillet1_2_piece_14a = extrude(amount=19.5, mode=Mode.PRIVATE)
    fillet1_2_piece_14a = split(fillet1_2_piece_14a, bisect_by=Plane(origin=(11.134185343, -4.400814657, -5.29875), z_dir=(0, 0, -1)), keep=Keep.TOP, mode=Mode.PRIVATE)
    with BuildSketch(Plane(origin=(17.955, -5.08, -5.29875), x_dir=(0, 0, -1), z_dir=(-1, 0, 0))) as fillet1_2_piece_14b_section:
        with BuildLine():
            CenterArc((FILLET1_R, -FILLET1_R), FILLET1_R, 90, 90)
            Line((0, -FILLET1_R), (0, 0))
            Line((0, 0), (FILLET1_R, 0))
        make_face()
    fillet1_2_piece_14b = extrude(amount=19.5, mode=Mode.PRIVATE)
    fillet1_2_piece_14b = split(fillet1_2_piece_14b, bisect_by=Plane(origin=(10.455, -4.400814657, -5.977935343), z_dir=(1, 0, 0)), keep=Keep.TOP, mode=Mode.PRIVATE)
    fillet1_2_piece_14 = fillet1_2_piece_14a & fillet1_2_piece_14b
    add(fillet1_2_piece_14, mode=Mode.SUBTRACT)
    with BuildSketch(Plane(origin=(-9.045, -5.08, 6.70125), x_dir=(0, 0, 1), z_dir=(1, 0, 0))) as fillet1_2_piece_15a_section:
        with BuildLine():
            CenterArc((FILLET1_R, -FILLET1_R), FILLET1_R, 90, 90)
            Line((0, -FILLET1_R), (0, 0))
            Line((0, 0), (FILLET1_R, 0))
        make_face()
    fillet1_2_piece_15a = extrude(amount=19.5, mode=Mode.PRIVATE)
    fillet1_2_piece_15a = split(fillet1_2_piece_15a, bisect_by=Plane(origin=(-1.545, -4.400814657, 7.380435343), z_dir=(-1, 0, 0)), keep=Keep.TOP, mode=Mode.PRIVATE)
    with BuildSketch(Plane(origin=(-1.545, -5.08, -5.29875), x_dir=(-1, 0, 0), z_dir=(0, 0, 1))) as fillet1_2_piece_15b_section:
        with BuildLine():
            CenterArc((FILLET1_R, -FILLET1_R), FILLET1_R, 90, 90)
            Line((0, -FILLET1_R), (0, 0))
            Line((0, 0), (FILLET1_R, 0))
        make_face()
    fillet1_2_piece_15b = extrude(amount=19.5, mode=Mode.PRIVATE)
    fillet1_2_piece_15b = split(fillet1_2_piece_15b, bisect_by=Plane(origin=(-2.224185343, -4.400814657, 6.70125), z_dir=(0, 0, 1)), keep=Keep.TOP, mode=Mode.PRIVATE)
    fillet1_2_piece_15 = fillet1_2_piece_15a & fillet1_2_piece_15b
    add(fillet1_2_piece_15, mode=Mode.SUBTRACT)
    with BuildSketch(Plane(origin=(-1.545, -5.08, -12.79875), x_dir=(-1, 0, 0), z_dir=(0, 0, 1))) as fillet1_2_piece_16a_section:
        with BuildLine():
            CenterArc((FILLET1_R, -FILLET1_R), FILLET1_R, 90, 90)
            Line((0, -FILLET1_R), (0, 0))
            Line((0, 0), (FILLET1_R, 0))
        make_face()
    fillet1_2_piece_16a = extrude(amount=19.5, mode=Mode.PRIVATE)
    fillet1_2_piece_16a = split(fillet1_2_piece_16a, bisect_by=Plane(origin=(-2.224185343, -4.400814657, -5.29875), z_dir=(0, 0, -1)), keep=Keep.TOP, mode=Mode.PRIVATE)
    with BuildSketch(Plane(origin=(10.455, -5.08, -5.29875), x_dir=(0, 0, -1), z_dir=(-1, 0, 0))) as fillet1_2_piece_16b_section:
        with BuildLine():
            CenterArc((FILLET1_R, -FILLET1_R), FILLET1_R, 90, 90)
            Line((0, -FILLET1_R), (0, 0))
            Line((0, 0), (FILLET1_R, 0))
        make_face()
    fillet1_2_piece_16b = extrude(amount=19.5, mode=Mode.PRIVATE)
    fillet1_2_piece_16b = split(fillet1_2_piece_16b, bisect_by=Plane(origin=(-1.545, -4.400814657, -5.977935343), z_dir=(-1, 0, 0)), keep=Keep.TOP, mode=Mode.PRIVATE)
    fillet1_2_piece_16 = fillet1_2_piece_16a & fillet1_2_piece_16b
    add(fillet1_2_piece_16, mode=Mode.SUBTRACT)
    # the kernel refuses this fillet: 3 mm, written as the material it takes off along each edge
    with BuildSketch(Plane(origin=(-18.545, 12, 17.95125), x_dir=(-1, 0, 0), z_dir=(0, 0, -1)), Plane(origin=(27.455, 12, -16.54875), x_dir=(1, 0, 0), z_dir=(0, 0, 1))) as fillet1_3_piece_1:
        with BuildLine():
            CenterArc((FILLET1_R, -FILLET1_R), FILLET1_R, 90, 90)
            Line((0, -FILLET1_R), (0, 0))
            Line((0, 0), (FILLET1_R, 0))
        make_face()
    extrude(amount=34.5, mode=Mode.SUBTRACT)
    with BuildSketch(Plane(origin=(24.455, 12, 20.95125), x_dir=(0, 0, 1), z_dir=(-1, 0, 0)), Plane(origin=(-15.545, 12, -19.54875), x_dir=(0, 0, -1), z_dir=(1, 0, 0))) as fillet1_3_piece_2:
        with BuildLine():
            CenterArc((FILLET1_R, -FILLET1_R), FILLET1_R, 90, 90)
            Line((0, -FILLET1_R), (0, 0))
            Line((0, 0), (FILLET1_R, 0))
        make_face()
    extrude(amount=40, mode=Mode.SUBTRACT)
    with BuildSketch(Plane(origin=(-15.545, 12, -16.54875), x_dir=(-1, 0, 0), z_dir=(0, 0, 1))) as fillet1_3_piece_3:
        with BuildLine():
            CenterArc((3 + FILLET1_R, FILLET1_R), FILLET1_R, 180, 90)
            Line((3, FILLET1_R), (3, 0))
            Line((3, 0), (3 + FILLET1_R, 0))
        make_face()
    revolve(axis=Axis((-15.545, 12, -16.54875), (0, -1, 0)), revolution_arc=90, mode=Mode.SUBTRACT)
    with BuildSketch(Plane(origin=(24.455, 12, -16.54875), x_dir=(0, 0, -1), z_dir=(-1, 0, 0))) as fillet1_3_piece_4:
        with BuildLine():
            CenterArc((3 + FILLET1_R, FILLET1_R), FILLET1_R, 180, 90)
            Line((3, FILLET1_R), (3, 0))
            Line((3, 0), (3 + FILLET1_R, 0))
        make_face()
    revolve(axis=Axis((24.455, 12, -16.54875), (0, -1, 0)), revolution_arc=90, mode=Mode.SUBTRACT)
    with BuildSketch(Plane(origin=(24.455, 12, 17.95125), x_dir=(0, 0, 1), z_dir=(-1, 0, 0))) as fillet1_3_piece_5:
        with BuildLine():
            CenterArc((3 + FILLET1_R, -FILLET1_R), FILLET1_R, 90, 90)
            Line((3, -FILLET1_R), (3, 0))
            Line((3, 0), (3 + FILLET1_R, 0))
        make_face()
    revolve(axis=Axis((24.455, 12, 17.95125), (0, 1, 0)), revolution_arc=90, mode=Mode.SUBTRACT)
    with BuildSketch(Plane(origin=(-15.545, 12, 17.95125), x_dir=(-1, 0, 0), z_dir=(0, 0, -1))) as fillet1_3_piece_6:
        with BuildLine():
            CenterArc((3 + FILLET1_R, -FILLET1_R), FILLET1_R, 90, 90)
            Line((3, -FILLET1_R), (3, 0))
            Line((3, 0), (3 + FILLET1_R, 0))
        make_face()
    revolve(axis=Axis((-15.545, 12, 17.95125), (0, 1, 0)), revolution_arc=90, mode=Mode.SUBTRACT)

    # Fillet2
    fillet2_edges = [part.edges().sort_by_distance(p)[0] for p in [
        (38.535, 9.46, 4.70125),
        (38.535, 9.46, -3.29875),
        (-29.625, 9.46, 4.70125),
        (-29.625, 9.46, -3.29875),
    ]]
    fillet(fillet2_edges, radius=FILLET2_R)

    # Fillet3
    fillet3_edges = [part.edges().sort_by_distance(p)[0] for p in [
        (10.455, 0, 0.70125),
        (4.455, 0, -5.29875),
        (-1.545, 0, 0.70125),
        (4.455, 0, 6.70125),
    ]]
    fillet(fillet3_edges, radius=FILLET3_R)


solid = part.part
